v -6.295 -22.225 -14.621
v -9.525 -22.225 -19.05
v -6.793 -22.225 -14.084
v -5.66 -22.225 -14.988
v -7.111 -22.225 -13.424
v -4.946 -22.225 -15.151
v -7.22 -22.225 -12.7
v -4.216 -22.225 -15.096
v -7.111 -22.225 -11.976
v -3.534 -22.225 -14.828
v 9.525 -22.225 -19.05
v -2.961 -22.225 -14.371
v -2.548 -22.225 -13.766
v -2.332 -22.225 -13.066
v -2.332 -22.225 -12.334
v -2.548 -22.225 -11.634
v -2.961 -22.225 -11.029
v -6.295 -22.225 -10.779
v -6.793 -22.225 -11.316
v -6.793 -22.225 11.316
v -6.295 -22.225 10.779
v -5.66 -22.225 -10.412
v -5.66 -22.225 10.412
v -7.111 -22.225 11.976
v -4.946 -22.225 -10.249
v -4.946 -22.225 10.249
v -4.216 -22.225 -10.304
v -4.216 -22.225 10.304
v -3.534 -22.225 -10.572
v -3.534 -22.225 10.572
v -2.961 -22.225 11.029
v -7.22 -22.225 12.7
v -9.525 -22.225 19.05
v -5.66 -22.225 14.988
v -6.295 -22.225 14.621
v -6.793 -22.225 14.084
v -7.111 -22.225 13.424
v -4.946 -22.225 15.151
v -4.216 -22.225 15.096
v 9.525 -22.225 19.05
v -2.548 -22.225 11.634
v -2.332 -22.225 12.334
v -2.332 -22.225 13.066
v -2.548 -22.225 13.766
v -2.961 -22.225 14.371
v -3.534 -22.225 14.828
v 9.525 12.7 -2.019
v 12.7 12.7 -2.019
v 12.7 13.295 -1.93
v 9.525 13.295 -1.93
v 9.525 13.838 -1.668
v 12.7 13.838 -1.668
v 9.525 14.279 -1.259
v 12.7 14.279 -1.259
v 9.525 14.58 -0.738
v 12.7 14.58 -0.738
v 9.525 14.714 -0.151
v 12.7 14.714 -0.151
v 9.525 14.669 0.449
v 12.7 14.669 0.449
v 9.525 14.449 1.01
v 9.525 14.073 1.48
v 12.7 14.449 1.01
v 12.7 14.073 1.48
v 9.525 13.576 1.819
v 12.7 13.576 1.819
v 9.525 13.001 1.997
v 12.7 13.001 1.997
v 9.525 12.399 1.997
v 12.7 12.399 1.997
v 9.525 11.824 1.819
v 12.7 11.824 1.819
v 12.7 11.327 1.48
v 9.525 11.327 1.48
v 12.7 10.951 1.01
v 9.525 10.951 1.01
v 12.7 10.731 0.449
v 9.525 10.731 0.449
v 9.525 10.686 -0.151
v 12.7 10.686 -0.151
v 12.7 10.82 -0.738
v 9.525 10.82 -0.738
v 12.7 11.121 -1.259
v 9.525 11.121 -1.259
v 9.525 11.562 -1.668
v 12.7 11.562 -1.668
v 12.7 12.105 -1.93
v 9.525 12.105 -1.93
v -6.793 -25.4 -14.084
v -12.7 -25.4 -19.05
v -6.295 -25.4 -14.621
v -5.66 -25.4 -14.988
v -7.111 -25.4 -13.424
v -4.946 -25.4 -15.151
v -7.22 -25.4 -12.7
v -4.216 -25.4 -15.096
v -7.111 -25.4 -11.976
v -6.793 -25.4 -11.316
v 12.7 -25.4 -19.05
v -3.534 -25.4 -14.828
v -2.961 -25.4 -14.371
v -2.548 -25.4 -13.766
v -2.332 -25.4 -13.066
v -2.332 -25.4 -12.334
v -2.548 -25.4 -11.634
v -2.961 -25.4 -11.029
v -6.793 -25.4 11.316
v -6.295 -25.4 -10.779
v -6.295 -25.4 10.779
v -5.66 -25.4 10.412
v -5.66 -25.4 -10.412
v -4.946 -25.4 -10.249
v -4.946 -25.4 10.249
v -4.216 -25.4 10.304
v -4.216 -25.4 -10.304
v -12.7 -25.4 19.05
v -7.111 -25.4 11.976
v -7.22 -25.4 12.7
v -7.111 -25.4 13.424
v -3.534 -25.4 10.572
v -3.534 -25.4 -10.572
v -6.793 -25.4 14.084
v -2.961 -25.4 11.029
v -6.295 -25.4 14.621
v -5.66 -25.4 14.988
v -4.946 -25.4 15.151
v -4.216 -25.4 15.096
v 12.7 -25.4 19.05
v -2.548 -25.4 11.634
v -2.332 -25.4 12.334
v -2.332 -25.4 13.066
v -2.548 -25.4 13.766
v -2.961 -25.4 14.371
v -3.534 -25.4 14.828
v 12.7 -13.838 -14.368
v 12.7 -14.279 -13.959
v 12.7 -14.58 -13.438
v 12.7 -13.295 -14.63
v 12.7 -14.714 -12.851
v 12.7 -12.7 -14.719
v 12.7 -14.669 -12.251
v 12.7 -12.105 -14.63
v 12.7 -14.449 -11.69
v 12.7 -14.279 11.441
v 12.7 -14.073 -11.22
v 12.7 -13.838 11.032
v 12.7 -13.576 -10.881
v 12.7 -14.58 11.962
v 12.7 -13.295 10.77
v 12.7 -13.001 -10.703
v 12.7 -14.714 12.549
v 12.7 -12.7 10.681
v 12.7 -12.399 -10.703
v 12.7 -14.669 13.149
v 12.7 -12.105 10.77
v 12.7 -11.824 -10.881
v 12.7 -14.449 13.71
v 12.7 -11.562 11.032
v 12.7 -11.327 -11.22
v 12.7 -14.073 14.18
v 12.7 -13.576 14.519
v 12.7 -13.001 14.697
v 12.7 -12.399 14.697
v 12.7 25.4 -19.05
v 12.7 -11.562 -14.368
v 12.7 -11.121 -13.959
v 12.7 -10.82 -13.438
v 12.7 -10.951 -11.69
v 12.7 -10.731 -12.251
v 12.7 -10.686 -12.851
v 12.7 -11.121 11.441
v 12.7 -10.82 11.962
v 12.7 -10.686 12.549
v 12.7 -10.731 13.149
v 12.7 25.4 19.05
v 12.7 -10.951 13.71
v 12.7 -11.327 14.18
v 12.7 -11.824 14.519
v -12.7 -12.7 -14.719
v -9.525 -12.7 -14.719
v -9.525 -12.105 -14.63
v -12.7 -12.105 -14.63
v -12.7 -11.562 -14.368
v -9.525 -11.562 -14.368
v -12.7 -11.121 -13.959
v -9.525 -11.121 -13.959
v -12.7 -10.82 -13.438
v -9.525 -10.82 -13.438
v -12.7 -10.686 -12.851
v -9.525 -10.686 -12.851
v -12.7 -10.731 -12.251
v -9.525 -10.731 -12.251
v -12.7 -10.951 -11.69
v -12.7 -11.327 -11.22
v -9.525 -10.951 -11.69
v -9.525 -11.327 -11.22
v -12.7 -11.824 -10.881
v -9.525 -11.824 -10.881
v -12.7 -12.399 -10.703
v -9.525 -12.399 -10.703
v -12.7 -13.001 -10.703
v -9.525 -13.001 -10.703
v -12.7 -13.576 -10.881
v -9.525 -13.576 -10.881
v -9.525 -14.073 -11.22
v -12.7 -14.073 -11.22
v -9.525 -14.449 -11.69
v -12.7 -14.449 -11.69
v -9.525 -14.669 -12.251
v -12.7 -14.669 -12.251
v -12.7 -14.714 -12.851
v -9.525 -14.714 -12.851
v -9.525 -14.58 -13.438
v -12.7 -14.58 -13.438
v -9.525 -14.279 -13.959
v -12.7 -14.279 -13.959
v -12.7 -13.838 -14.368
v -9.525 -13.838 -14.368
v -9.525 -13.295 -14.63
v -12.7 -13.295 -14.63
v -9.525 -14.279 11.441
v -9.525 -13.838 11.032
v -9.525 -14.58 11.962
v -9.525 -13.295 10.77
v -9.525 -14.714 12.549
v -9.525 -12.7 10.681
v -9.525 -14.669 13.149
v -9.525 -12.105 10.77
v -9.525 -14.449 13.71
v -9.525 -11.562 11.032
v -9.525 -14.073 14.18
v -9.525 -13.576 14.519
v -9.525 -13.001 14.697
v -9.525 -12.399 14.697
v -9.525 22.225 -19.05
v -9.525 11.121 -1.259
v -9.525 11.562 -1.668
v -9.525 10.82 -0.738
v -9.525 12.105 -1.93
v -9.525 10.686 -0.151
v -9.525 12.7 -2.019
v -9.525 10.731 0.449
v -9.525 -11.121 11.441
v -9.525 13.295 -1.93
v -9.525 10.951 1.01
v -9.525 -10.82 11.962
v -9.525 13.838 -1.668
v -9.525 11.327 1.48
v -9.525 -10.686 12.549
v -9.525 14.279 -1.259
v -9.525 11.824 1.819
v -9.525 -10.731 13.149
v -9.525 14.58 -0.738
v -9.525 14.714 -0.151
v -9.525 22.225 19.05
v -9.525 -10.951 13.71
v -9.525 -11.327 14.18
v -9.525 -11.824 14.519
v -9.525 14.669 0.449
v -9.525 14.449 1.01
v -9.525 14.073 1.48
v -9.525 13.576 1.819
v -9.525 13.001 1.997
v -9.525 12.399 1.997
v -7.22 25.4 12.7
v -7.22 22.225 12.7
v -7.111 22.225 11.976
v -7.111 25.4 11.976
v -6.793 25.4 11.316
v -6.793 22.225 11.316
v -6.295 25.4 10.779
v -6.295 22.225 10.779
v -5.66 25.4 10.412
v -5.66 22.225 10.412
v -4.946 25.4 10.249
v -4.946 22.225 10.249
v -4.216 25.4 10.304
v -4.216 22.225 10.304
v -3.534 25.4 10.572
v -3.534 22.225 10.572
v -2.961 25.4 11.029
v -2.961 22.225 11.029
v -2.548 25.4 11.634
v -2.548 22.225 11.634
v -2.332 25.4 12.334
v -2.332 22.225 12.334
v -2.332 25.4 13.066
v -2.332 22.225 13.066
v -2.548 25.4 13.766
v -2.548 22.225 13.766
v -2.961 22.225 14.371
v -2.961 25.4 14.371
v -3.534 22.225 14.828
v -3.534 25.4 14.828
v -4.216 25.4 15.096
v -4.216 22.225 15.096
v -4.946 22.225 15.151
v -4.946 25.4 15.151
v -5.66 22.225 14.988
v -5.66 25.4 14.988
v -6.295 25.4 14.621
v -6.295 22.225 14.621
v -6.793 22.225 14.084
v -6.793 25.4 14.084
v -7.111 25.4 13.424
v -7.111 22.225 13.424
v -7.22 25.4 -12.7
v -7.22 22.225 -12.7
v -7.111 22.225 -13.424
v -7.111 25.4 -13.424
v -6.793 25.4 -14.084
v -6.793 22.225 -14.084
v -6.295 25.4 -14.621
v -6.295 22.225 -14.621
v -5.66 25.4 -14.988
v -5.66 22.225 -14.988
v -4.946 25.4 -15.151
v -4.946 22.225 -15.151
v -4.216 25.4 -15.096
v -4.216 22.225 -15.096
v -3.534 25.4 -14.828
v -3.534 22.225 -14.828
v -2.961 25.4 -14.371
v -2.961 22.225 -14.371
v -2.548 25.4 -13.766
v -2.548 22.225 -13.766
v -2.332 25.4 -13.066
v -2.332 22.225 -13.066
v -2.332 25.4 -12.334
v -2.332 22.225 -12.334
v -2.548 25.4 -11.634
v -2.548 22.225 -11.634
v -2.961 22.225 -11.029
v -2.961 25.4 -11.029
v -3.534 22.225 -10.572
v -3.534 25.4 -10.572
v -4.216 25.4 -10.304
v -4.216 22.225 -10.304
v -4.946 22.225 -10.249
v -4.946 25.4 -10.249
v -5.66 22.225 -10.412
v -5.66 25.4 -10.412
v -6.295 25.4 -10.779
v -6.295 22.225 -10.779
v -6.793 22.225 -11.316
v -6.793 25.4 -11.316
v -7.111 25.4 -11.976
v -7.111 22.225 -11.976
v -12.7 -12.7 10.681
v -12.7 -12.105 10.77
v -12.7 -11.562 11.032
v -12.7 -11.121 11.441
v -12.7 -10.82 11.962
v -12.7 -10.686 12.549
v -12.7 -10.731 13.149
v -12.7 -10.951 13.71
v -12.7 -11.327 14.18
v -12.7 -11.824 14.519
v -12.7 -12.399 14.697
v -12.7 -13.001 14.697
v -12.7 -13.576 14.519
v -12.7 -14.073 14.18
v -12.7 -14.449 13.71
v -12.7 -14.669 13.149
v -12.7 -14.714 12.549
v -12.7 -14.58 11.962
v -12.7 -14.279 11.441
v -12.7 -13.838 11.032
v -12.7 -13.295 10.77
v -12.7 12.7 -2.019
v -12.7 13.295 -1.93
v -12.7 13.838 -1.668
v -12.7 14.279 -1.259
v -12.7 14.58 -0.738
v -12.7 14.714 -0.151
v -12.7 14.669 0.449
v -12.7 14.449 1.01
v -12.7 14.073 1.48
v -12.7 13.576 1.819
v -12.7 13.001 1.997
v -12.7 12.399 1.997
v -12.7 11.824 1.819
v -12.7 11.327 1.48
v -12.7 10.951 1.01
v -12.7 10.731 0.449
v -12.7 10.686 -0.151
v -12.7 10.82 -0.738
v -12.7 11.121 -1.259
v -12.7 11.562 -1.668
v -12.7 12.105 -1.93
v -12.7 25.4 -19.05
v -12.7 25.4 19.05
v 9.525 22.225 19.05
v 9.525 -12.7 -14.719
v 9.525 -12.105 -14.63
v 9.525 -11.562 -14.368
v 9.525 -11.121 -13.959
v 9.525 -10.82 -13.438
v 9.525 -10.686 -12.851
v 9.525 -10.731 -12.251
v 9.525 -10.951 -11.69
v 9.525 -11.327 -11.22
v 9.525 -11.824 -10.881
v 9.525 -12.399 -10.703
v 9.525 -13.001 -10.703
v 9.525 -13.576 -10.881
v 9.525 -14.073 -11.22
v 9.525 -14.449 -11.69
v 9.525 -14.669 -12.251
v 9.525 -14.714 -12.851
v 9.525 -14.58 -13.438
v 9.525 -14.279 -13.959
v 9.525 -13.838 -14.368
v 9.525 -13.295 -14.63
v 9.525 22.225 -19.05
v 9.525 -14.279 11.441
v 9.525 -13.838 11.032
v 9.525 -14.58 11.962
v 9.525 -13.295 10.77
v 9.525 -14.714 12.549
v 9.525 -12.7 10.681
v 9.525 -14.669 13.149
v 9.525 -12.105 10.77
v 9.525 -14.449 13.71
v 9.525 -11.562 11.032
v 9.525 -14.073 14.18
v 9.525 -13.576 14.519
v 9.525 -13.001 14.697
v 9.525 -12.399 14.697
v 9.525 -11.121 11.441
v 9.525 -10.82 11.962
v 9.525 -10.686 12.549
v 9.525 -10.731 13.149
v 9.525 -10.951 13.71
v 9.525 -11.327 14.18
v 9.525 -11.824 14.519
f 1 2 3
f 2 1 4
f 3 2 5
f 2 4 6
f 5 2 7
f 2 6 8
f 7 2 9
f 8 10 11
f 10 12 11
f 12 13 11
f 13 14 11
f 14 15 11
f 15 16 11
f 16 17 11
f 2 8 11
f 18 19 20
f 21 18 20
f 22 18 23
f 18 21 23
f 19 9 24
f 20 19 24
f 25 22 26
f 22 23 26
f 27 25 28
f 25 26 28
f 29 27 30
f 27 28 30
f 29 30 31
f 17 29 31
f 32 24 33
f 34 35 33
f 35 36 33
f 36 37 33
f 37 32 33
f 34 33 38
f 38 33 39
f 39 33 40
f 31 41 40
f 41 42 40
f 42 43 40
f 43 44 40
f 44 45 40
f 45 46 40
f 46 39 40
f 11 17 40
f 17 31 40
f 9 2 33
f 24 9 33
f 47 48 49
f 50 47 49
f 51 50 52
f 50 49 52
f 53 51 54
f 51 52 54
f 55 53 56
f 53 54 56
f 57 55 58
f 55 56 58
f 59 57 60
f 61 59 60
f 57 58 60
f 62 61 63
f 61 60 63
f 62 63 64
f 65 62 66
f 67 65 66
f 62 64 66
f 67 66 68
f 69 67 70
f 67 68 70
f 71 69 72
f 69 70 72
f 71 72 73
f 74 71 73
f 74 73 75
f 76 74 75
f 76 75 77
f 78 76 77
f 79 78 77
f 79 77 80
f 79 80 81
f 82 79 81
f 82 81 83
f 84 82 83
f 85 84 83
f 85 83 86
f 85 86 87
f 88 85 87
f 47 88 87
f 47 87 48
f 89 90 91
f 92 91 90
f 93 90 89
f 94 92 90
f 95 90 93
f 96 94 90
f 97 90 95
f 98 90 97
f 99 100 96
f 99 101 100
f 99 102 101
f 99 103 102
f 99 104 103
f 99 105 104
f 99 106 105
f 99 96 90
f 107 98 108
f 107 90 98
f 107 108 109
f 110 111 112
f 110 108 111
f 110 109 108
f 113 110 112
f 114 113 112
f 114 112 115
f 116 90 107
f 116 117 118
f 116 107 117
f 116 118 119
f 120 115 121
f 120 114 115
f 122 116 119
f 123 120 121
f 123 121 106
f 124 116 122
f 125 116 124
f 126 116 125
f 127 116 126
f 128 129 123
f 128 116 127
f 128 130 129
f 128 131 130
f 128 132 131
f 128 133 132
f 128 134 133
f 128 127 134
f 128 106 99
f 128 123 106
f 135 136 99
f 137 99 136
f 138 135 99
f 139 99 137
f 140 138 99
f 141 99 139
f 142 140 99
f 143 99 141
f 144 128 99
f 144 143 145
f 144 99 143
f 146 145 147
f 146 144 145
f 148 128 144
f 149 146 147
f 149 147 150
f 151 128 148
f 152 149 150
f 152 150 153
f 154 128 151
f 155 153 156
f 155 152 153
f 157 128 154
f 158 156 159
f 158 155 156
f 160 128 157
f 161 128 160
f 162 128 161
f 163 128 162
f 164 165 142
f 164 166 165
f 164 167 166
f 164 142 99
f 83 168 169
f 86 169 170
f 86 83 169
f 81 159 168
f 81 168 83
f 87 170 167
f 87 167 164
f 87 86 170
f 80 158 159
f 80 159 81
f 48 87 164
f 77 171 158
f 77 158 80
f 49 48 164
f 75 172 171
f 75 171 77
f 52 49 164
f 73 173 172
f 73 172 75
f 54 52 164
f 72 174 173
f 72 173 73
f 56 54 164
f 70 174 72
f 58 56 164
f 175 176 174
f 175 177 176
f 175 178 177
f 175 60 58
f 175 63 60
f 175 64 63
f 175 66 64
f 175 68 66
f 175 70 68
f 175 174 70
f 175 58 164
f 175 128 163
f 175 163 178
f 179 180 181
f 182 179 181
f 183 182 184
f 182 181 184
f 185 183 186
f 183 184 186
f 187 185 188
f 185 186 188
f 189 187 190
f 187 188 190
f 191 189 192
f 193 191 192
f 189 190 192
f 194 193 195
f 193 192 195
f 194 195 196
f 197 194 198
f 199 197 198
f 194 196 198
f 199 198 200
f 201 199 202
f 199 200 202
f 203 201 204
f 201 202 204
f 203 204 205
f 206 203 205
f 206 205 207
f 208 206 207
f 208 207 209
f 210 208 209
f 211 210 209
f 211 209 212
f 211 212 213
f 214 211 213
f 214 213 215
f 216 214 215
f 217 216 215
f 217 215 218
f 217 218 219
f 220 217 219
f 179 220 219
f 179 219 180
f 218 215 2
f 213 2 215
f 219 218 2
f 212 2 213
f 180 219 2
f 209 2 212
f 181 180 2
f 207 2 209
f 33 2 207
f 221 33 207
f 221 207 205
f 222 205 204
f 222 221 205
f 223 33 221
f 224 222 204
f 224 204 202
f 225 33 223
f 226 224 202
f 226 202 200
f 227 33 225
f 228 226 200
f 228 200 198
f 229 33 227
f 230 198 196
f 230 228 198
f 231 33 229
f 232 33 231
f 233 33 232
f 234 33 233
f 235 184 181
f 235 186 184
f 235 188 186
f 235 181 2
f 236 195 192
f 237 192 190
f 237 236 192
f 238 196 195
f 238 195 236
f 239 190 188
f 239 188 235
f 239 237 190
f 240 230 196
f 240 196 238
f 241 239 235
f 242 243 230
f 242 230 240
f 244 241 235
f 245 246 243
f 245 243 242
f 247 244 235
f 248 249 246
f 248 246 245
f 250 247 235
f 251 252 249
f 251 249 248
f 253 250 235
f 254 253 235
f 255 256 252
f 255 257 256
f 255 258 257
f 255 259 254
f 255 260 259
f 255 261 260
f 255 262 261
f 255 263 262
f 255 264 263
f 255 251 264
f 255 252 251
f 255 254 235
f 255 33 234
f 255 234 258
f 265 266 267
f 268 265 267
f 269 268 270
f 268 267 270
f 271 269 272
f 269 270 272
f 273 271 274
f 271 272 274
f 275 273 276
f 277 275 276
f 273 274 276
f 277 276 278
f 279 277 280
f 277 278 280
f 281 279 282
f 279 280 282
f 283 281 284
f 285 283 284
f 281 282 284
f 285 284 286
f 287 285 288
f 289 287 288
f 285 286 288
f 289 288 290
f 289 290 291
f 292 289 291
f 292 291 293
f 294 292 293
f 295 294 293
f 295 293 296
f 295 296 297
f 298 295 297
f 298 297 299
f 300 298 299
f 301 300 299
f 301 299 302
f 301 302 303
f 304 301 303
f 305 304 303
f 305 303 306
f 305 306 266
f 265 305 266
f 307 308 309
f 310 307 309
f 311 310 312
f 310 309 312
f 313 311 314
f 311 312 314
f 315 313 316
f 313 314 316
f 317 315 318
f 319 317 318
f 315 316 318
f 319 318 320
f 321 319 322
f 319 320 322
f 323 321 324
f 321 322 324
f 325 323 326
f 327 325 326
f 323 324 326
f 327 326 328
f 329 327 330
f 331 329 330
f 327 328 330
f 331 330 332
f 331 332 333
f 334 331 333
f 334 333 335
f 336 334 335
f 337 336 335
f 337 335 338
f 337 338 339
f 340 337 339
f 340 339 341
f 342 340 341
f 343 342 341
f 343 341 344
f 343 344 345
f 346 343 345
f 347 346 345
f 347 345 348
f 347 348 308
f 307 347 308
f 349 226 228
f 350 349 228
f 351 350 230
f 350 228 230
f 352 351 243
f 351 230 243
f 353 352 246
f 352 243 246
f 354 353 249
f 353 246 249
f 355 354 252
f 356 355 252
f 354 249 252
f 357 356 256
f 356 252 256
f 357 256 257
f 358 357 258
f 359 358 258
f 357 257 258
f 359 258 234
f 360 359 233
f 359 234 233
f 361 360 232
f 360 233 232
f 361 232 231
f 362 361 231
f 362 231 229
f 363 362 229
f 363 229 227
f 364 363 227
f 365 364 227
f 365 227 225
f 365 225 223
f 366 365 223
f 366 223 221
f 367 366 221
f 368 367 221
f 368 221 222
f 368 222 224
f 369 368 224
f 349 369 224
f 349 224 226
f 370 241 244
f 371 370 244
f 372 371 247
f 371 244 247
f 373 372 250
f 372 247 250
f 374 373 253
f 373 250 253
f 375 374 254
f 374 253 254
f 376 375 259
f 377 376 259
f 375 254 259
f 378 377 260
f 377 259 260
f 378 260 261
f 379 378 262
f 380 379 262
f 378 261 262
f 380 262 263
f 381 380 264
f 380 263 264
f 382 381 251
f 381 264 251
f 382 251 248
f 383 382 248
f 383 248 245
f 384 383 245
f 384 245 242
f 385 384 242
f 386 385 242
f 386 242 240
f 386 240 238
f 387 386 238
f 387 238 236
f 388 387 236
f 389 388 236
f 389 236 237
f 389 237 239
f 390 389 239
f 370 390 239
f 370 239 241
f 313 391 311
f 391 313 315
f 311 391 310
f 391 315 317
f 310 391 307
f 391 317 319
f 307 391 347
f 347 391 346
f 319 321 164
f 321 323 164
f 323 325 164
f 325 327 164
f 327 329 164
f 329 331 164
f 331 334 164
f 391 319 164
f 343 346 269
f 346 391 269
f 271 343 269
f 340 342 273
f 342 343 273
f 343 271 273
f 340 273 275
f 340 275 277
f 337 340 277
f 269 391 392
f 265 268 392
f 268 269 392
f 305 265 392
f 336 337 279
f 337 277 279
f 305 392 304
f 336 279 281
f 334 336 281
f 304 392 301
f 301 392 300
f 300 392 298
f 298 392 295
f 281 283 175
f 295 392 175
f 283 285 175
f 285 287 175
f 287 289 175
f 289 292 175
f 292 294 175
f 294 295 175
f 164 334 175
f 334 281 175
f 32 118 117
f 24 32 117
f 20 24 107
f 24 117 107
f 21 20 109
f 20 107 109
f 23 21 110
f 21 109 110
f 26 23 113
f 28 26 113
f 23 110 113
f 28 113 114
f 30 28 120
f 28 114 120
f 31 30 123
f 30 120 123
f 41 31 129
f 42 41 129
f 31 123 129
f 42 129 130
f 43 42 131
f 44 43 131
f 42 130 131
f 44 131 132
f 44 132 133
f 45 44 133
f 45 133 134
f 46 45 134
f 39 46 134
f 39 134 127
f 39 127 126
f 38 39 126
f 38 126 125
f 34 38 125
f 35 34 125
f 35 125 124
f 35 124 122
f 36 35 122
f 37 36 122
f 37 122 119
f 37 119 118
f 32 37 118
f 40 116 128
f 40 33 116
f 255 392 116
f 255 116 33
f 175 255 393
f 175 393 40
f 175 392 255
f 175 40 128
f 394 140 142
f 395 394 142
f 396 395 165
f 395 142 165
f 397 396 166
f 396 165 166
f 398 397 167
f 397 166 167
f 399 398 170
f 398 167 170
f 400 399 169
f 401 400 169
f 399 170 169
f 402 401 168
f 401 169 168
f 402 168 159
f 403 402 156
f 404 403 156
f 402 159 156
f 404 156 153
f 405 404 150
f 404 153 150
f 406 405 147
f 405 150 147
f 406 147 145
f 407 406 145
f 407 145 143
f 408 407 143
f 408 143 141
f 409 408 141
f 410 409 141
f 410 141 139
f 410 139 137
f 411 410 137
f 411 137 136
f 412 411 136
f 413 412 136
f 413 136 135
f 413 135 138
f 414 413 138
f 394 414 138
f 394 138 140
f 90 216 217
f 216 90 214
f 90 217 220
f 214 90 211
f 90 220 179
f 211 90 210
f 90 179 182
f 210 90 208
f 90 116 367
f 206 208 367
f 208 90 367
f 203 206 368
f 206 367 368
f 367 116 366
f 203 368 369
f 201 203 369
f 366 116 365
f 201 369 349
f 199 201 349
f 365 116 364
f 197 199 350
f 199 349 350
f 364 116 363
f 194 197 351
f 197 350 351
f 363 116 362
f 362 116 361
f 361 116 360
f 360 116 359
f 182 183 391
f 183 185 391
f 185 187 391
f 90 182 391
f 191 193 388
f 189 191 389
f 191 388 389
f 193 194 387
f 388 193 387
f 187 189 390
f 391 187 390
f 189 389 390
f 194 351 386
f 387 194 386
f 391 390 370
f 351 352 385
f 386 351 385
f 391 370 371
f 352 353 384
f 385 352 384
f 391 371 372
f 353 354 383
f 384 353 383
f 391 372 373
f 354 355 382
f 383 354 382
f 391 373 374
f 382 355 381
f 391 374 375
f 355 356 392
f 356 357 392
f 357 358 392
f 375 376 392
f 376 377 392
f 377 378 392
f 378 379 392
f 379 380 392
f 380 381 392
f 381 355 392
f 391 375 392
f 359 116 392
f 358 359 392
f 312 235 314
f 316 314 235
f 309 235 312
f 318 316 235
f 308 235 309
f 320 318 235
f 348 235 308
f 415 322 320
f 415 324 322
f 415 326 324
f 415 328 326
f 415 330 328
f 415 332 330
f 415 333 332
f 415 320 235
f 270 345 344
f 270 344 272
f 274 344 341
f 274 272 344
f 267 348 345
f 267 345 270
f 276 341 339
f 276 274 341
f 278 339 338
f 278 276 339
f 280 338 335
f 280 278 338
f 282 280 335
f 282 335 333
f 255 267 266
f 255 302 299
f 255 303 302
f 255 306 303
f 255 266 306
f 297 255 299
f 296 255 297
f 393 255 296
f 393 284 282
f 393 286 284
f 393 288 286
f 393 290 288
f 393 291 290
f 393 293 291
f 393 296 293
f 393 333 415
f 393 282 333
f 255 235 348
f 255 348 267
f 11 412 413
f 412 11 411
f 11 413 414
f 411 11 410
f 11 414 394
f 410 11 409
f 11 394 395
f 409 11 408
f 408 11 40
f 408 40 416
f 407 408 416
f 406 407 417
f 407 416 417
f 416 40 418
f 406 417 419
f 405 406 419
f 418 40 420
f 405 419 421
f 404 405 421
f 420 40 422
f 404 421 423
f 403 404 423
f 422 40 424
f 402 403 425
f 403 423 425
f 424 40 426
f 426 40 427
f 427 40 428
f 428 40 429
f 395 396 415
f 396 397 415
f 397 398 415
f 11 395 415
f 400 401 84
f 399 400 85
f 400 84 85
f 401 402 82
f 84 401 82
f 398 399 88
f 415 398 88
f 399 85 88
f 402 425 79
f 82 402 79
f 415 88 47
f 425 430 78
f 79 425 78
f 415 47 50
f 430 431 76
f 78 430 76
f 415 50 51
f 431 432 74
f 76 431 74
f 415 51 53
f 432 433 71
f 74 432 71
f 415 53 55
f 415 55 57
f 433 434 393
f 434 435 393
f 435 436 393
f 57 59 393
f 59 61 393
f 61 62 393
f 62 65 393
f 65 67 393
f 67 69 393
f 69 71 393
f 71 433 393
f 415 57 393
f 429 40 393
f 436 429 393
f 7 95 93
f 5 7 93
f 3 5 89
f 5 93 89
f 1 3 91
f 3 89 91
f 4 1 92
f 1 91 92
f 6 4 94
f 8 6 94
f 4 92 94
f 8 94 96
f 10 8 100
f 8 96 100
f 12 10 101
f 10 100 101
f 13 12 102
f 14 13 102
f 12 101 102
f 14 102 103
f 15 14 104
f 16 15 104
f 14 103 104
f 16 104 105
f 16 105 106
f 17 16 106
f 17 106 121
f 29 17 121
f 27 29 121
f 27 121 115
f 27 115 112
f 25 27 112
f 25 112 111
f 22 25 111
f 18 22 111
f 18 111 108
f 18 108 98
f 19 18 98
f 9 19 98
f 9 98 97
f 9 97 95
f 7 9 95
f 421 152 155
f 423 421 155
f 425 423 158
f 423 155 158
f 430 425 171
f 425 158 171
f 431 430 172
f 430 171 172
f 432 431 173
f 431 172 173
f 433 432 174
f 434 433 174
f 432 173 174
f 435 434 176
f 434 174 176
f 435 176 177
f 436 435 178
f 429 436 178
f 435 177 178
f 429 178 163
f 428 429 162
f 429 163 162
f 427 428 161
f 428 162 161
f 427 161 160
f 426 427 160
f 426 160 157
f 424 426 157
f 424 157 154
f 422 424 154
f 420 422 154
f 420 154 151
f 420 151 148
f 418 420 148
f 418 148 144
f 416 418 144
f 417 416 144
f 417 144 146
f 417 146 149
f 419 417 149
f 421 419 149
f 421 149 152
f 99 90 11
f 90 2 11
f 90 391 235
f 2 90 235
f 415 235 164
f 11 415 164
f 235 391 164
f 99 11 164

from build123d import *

# Parameters (mm, degrees)
SKETCH1_W                    = 25.4
SKETCH1_H                    = 50.8
SKETCH1_W_2                  = 19.05
SKETCH1_H_2                  = 44.45
BOSS_EXTRUDE1_DEPTH          = 19.05
F_10_0_1935_DIAMETER_HOLE1_D = 4.9149
F_10_32_TAPPED_HOLE1_D       = 4.0386


with BuildPart() as part:
    # Sketch1 → Boss-Extrude1 (new, symmetric)
    with BuildSketch(Plane.XY):
        Rectangle(SKETCH1_W, SKETCH1_H)
        Rectangle(SKETCH1_W_2, SKETCH1_H_2, mode=Mode.SUBTRACT)
    extrude(amount=BOSS_EXTRUDE1_DEPTH, both=True)

    # #10 (0.1935) Diameter Hole1 (through all)
    with Locations(Plane(origin=(0, 25.4, 0), x_dir=(1, 0, 0), z_dir=(0, 1, 0))):
        with Locations((-4.7625, -12.7), (-4.7625, 12.7)):
            Hole(F_10_0_1935_DIAMETER_HOLE1_D / 2)

    # #10-32 Tapped Hole1 (through all)
    with Locations(Plane.ZY.offset(12.7)):
        with Locations((-12.7, -12.7), (12.7, -12.7), (0, 12.7)):
            Hole(F_10_32_TAPPED_HOLE1_D / 2)


solid = part.part
